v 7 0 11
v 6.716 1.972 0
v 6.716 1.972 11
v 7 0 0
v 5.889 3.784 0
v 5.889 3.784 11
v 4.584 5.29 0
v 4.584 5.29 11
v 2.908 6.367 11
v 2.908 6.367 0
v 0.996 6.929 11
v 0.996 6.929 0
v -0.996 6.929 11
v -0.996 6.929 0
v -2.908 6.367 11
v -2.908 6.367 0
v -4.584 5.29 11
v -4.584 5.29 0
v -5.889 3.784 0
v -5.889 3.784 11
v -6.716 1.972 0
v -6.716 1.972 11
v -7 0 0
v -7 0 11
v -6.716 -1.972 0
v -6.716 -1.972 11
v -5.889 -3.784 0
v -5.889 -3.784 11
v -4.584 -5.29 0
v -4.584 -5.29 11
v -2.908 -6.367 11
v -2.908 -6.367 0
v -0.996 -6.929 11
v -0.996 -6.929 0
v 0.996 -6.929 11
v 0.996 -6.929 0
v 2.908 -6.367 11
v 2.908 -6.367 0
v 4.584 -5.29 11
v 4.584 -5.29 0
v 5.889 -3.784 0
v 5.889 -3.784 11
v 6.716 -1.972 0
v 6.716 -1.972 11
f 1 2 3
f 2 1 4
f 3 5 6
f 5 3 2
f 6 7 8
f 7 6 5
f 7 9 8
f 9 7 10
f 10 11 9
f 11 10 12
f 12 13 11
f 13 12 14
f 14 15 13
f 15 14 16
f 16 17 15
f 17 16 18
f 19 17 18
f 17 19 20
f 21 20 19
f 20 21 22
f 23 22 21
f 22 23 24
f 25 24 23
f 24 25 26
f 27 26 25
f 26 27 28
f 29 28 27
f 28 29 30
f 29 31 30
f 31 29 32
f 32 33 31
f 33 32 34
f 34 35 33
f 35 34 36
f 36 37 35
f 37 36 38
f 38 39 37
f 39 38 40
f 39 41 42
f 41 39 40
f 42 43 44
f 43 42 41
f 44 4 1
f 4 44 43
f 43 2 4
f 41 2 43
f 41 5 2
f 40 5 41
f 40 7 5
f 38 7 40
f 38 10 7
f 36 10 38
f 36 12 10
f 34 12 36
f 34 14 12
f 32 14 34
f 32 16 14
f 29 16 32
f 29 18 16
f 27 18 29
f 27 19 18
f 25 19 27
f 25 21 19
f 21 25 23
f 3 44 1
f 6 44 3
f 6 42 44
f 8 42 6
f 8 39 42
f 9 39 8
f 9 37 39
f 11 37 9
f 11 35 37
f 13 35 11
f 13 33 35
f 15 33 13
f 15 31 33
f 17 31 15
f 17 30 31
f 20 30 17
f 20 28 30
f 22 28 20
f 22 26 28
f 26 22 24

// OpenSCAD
// Generated by SolidPython 1.0.1 on 2020-07-29 00:46:44


cylinder(h = 11, r1 = 7, r2 = 7);
/***********************************************
*********      SolidPython code:      **********
************************************************
 
# import packages: SolidPython
from solid import *
from solid.utils import *
from itertools import chain, combinations, permutations


class Resize:

    def __init__(self, scad_file):
        self.scad_file = scad_file
        #self.scad_file = import_scad(scad_file)
        # cone/cylinder param:
        self.r1 = 0
        self.r2 = 0
        self.h = 0
        # rectangular prism param:
        self.w = 0
        self.l = 0
        # ellipse param:
        self.r = 0

    # import OpenScad code (file name corresponds to shape)


    # classify shape + parameters
    def assign(self, param1, param2, param3):
        if self.scad_file == 'cone.scad':
            self.r1 = param1
            self.r2 = param2
            self.h = param3
        elif self.scad_file == 'cylinder.scad':
            self.r1 = param1
            self.r2 = param2
            self.h = param3
        elif self.scad_file == 'rectangularPrism.scad':
            self.h = param1
            self.l = param2
            self.w = param3
        else:
            self.r = param1
            self.h = param2

    # resize parameters
    def iterate(self):
        x = range(3, 20, 2)
        i = 1
        if self.scad_file == 'cone.scad':
            tempList = list(permutations(x, 2))
            for temp in tempList:
                param1 = temp[0]
                param2 = temp[1]
                filepath = 'produced_scad_files/' + 'cone' + str(param1) + '_' + str(param2) + '_' + '.scad'
                scad_render_to_file(cylinder(h=param1, r1=param2, r2=0), filepath)

        elif self.scad_file == 'cylinder.scad':
            tempList = list(permutations(x, 3))
            for temp in tempList:
                param1 = temp[0]
                param2 = temp[1]
                filepath = 'produced_scad_files/' + 'cylinder' + str(param1) + '_' + str(param2) + '_' + '.scad'
                scad_render_to_file(cylinder(h=param1, r1=param2, r2=param2), filepath)

        elif self.scad_file == 'rectangularPrism.scad':
            tempList = list(permutations(x, 3))
            for temp in tempList:
                param1 = temp[0]
                param2 = temp[1]
                param3 = temp[2]
                filepath = 'produced_scad_files/' + 'rectangularPrism' + str(param1) + '_' + str(param2) + '_' + str(
                    param3) + '.scad'
                scad_render_to_file(cube(size=(param1, param2, param3)), filepath)

        elif self.scad_file == 'ellipse.scad':
            tempList = list(permutations(x, 4))
            for temp in tempList:
                param1 = temp[0]
                param2 = temp[1]
                param3 = temp[2]
                param4 = temp[3]
                filepath = 'produced_scad_files/' + 'ellipse' + str(param1) + '_' + str(param2) + '_' + str(param3) + '_' + str(param4) + '.scad'
                scad_render_to_file(scale([param1, param2, param3])(sphere(r=param4)), filepath)

    def render_to_scadfile(self):
        scad_render_to_file(scad, 'example.scad') 
 
************************************************/
